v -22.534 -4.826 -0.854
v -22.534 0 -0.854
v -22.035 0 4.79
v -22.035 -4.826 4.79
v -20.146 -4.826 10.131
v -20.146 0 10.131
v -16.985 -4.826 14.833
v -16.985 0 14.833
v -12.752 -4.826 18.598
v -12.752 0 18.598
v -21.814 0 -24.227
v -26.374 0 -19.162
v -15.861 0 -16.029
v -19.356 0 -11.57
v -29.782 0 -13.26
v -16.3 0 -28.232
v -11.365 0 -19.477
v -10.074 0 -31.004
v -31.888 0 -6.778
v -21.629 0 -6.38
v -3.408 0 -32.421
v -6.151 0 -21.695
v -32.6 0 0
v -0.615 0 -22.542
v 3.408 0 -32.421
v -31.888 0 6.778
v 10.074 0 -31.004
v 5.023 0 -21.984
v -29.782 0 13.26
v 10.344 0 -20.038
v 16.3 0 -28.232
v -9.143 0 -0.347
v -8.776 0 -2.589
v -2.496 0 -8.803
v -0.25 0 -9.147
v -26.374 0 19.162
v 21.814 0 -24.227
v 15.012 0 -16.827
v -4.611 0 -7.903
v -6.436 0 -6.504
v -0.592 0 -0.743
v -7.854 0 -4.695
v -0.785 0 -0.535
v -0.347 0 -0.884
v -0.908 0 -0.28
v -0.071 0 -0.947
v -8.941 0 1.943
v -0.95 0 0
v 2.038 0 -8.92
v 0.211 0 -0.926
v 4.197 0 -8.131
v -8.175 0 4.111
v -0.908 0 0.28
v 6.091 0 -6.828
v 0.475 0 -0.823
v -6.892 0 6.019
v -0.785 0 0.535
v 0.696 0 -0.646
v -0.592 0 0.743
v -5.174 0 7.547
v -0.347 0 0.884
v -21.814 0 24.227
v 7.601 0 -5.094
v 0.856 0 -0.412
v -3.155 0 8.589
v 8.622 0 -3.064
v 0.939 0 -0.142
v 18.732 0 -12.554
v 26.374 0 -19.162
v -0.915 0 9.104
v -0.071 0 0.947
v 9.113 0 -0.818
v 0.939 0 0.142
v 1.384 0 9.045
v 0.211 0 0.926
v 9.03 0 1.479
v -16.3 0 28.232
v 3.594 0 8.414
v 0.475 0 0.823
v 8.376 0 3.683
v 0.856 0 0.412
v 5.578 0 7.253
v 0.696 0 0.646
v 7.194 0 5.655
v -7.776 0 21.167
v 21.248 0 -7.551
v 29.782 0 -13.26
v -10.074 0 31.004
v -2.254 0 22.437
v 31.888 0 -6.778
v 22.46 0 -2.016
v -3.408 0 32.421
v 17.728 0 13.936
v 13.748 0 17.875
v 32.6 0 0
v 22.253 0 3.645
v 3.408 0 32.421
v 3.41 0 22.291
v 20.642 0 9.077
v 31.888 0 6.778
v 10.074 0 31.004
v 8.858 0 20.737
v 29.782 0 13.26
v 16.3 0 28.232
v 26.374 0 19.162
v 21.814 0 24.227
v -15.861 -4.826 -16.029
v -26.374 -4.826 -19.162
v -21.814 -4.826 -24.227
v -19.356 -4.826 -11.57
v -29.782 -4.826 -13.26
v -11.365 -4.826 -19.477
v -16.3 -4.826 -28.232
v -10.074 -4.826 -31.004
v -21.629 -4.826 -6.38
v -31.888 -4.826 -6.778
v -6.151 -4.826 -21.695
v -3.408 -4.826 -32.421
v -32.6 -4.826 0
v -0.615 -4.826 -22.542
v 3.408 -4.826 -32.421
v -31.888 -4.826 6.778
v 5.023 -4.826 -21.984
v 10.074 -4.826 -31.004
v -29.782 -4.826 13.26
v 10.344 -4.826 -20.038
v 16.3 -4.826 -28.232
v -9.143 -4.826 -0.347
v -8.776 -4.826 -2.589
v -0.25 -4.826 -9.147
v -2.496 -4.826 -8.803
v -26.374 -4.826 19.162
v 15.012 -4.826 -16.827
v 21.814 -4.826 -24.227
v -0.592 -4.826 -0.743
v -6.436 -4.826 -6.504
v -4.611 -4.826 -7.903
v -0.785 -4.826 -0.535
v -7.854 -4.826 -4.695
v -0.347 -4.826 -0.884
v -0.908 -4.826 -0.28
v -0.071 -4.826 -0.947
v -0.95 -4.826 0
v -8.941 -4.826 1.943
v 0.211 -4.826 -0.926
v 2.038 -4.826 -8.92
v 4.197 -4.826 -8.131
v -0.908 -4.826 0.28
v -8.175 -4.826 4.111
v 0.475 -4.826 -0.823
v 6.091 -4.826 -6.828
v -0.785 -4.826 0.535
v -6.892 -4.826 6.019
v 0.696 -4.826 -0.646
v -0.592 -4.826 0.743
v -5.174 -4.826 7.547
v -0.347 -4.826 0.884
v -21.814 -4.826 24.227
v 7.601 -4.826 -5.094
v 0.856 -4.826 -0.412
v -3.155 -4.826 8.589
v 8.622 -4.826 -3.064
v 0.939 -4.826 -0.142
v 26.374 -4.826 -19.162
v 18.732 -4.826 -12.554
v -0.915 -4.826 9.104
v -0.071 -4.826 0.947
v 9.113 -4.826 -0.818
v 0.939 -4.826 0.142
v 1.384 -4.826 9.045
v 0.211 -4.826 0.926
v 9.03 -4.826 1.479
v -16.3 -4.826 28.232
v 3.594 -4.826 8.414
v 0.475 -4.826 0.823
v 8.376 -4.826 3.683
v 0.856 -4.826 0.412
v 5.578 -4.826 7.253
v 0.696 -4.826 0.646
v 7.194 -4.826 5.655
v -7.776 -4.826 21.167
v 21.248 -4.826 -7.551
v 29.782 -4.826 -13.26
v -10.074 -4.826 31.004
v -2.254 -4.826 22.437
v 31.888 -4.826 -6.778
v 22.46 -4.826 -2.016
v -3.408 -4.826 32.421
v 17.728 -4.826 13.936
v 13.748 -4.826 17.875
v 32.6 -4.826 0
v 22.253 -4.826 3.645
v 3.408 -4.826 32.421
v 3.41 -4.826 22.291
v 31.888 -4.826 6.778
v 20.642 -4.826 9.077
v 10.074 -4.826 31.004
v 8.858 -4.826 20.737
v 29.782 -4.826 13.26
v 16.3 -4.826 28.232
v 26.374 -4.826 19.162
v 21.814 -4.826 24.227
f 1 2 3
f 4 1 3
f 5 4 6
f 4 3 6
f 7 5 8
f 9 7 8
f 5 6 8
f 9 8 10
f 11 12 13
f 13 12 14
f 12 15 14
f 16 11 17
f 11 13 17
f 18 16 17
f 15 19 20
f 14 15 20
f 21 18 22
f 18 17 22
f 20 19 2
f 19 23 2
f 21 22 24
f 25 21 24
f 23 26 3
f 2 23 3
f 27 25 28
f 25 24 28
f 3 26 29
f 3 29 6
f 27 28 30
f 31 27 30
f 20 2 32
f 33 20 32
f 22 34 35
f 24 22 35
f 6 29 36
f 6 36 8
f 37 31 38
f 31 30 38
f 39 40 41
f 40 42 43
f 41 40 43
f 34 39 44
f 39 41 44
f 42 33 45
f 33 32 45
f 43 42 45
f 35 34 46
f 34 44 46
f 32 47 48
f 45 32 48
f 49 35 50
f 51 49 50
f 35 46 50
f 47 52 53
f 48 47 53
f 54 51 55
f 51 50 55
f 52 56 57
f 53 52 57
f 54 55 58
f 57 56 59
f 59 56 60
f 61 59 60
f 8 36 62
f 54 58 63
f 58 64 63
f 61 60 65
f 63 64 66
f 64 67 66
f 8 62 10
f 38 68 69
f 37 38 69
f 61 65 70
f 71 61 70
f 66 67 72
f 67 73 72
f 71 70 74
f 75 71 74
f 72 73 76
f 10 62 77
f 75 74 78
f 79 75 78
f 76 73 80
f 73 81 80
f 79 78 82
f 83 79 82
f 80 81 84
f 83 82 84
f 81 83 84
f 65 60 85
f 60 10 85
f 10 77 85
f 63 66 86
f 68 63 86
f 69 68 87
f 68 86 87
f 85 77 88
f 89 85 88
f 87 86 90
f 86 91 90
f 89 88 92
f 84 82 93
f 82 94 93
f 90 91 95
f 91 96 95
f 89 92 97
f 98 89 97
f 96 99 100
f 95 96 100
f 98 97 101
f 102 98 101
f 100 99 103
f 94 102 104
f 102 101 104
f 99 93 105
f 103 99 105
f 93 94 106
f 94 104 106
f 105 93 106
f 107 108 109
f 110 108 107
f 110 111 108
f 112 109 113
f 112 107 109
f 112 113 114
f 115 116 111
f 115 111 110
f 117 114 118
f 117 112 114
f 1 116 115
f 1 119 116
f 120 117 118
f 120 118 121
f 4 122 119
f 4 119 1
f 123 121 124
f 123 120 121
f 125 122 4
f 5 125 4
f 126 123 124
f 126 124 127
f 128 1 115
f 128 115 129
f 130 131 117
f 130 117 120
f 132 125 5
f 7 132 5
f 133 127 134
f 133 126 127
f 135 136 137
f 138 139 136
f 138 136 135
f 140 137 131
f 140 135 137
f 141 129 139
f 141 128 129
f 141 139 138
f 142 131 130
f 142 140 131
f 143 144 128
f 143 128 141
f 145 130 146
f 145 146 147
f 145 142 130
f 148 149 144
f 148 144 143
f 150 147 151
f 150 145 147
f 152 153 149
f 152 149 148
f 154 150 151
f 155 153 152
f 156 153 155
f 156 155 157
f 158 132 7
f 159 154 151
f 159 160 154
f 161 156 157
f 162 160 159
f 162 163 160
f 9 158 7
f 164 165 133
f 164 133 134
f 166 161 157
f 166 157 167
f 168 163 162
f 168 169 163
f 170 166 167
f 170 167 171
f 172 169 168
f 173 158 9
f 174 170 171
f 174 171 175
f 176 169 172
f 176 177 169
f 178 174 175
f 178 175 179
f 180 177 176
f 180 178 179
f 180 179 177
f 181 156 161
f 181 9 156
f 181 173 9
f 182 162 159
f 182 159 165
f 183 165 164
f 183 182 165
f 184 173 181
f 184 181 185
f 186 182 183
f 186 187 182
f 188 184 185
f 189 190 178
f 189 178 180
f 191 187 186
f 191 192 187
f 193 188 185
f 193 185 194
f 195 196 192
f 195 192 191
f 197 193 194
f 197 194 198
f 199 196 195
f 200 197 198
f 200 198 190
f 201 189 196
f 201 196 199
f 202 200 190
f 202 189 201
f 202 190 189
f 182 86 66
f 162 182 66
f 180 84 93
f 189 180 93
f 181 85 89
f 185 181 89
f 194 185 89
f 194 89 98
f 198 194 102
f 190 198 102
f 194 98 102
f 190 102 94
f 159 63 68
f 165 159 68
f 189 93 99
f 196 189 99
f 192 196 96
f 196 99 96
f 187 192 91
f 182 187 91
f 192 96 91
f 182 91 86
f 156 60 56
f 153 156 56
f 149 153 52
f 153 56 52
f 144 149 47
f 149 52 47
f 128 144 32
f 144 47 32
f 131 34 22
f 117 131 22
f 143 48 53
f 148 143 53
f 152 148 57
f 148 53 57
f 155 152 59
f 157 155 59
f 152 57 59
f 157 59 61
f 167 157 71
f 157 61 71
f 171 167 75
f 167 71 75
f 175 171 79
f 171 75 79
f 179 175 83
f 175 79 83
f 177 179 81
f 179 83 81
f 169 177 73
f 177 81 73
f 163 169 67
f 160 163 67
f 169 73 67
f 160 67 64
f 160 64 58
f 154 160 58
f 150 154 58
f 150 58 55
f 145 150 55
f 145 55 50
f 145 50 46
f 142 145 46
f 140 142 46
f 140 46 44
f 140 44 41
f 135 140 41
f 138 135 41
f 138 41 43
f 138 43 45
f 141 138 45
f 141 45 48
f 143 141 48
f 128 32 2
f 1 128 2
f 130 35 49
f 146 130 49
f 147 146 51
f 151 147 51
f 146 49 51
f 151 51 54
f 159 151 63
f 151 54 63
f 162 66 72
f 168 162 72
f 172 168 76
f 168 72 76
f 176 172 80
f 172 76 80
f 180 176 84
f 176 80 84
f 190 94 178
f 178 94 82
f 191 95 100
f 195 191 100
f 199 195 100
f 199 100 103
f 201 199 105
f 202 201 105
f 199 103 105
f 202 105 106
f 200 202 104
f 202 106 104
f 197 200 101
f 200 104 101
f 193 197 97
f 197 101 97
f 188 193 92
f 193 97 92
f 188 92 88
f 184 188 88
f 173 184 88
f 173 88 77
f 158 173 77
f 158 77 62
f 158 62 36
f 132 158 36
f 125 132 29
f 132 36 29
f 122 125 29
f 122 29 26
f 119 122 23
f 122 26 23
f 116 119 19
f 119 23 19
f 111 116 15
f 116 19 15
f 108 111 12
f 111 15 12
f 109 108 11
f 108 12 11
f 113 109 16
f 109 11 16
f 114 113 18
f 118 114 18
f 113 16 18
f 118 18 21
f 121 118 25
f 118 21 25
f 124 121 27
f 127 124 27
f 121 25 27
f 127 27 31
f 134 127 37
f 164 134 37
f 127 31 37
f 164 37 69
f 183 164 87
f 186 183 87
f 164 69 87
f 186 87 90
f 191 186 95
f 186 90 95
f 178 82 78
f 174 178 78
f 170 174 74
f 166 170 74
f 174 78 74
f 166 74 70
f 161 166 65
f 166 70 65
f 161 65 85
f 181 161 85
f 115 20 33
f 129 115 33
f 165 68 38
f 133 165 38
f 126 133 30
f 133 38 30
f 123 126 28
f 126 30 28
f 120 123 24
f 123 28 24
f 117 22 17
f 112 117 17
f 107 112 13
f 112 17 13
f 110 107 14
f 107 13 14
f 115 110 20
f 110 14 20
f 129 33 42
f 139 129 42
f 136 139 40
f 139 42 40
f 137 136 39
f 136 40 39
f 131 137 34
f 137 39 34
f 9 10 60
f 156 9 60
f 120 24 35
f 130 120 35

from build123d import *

# Parameters (mm, degrees)
F0_R     = 32.6
F1_DEPTH = 4.826
F2_R     = 2.45
F3_DEPTH = 25
F4_R     = 4.5746249326
F5_DEPTH = 4.826
F6_R     = 0.95
F7_DEPTH = 6.7


# Not quite as in the source:
# - a feature names something its author has since deleted; it is built from what else it names


with BuildPart() as f1:
    # F0 (on Front) → F1 (new body)
    with BuildSketch(Plane.XZ):
        Circle(F0_R)
        with BuildLine():
            ThreePointArc((-6.1511106358, -21.6948458844), (-15.8606587348, -16.0294106098), (-21.6285333971, -6.3803638683))
            Line((-21.6285333971, -6.3803638683), (-8.7761011345, -2.5889281328))
            ThreePointArc((-8.7761011345, -2.5889281328), (-6.435699664, -6.5041732629), (-2.4959052026, -8.8030084187))
            Line((-2.4959052026, -8.8030084187), (-6.1511106358, -21.6948458844))
        make_face(mode=Mode.SUBTRACT)
        with BuildLine():
            ThreePointArc((18.7322268276, -12.5541299212), (10.3436623217, -20.0377431307), (-0.6154977498, -22.5415984908))
            Line((-0.6154977498, -22.5415984908), (-0.249747424, -9.1465909619))
            ThreePointArc((-0.249747424, -9.1465909619), (4.197095798, -8.130614175), (7.6008813957, -5.09402611))
            Line((7.6008813957, -5.09402611), (18.7322268276, -12.5541299212))
        make_face(mode=Mode.SUBTRACT)
        with BuildLine():
            Line((-12.7516710164, 18.5983167596), (-5.1741813659, 7.5465453814))
            ThreePointArc((-5.1741813659, 7.5465453814), (-8.1745769317, 4.1108140298), (-9.1434356436, -0.3465322961))
            Line((-9.1434356436, -0.3465322961), (-22.5338222691, -0.854022216))
            ThreePointArc((-22.5338222691, -0.854022216), (-20.1460885038, 10.1310225543), (-12.7516710164, 18.5983167596))
        make_face(mode=Mode.SUBTRACT)
        with BuildLine():
            ThreePointArc((17.7282635002, 13.9359668938), (22.2533936178, 3.6454042971), (21.2481348677, -7.5511101598))
            Line((21.2481348677, -7.5511101598), (8.6217487379, -3.0639759628))
            ThreePointArc((8.6217487379, -3.0639759628), (9.0296475212, 1.4791773534), (7.1935082495, 5.6547271432))
            Line((7.1935082495, 5.6547271432), (17.7282635002, 13.9359668938))
        make_face(mode=Mode.SUBTRACT)
        with BuildLine():
            Line((-3.1550487991, 8.5888396815), (-7.7755574229, 21.1670311277))
            ThreePointArc((-7.7755574229, 21.1670311277), (3.4096912991, 22.2907268891), (13.7475672956, 17.8747557593))
            Line((13.7475672956, 17.8747557593), (5.5782811865, 7.2529496762))
            ThreePointArc((5.5782811865, 7.2529496762), (1.3835332766, 9.0447960548), (-3.1550487991, 8.5888396815))
        make_face(mode=Mode.SUBTRACT)
    extrude(amount=F1_DEPTH)

    # F2 (on Front) → F3 (cut, symmetric)
    with BuildSketch(Plane.XZ):
        Circle(F2_R)
    extrude(amount=F3_DEPTH, both=True, mode=Mode.SUBTRACT)

    # F4 (on Front) → F5 (join)
    with BuildSketch(Plane.XZ):
        Circle(F4_R)
    extrude(amount=F5_DEPTH)

    # F6 (on face) → F7 (cut)
    with BuildSketch(Plane(origin=(0, 0, 0), x_dir=(-1, 0, 0), z_dir=(0, 1, 0))):
        Circle(F6_R)
    extrude(amount=-F7_DEPTH, mode=Mode.SUBTRACT)


solid = f1.part
